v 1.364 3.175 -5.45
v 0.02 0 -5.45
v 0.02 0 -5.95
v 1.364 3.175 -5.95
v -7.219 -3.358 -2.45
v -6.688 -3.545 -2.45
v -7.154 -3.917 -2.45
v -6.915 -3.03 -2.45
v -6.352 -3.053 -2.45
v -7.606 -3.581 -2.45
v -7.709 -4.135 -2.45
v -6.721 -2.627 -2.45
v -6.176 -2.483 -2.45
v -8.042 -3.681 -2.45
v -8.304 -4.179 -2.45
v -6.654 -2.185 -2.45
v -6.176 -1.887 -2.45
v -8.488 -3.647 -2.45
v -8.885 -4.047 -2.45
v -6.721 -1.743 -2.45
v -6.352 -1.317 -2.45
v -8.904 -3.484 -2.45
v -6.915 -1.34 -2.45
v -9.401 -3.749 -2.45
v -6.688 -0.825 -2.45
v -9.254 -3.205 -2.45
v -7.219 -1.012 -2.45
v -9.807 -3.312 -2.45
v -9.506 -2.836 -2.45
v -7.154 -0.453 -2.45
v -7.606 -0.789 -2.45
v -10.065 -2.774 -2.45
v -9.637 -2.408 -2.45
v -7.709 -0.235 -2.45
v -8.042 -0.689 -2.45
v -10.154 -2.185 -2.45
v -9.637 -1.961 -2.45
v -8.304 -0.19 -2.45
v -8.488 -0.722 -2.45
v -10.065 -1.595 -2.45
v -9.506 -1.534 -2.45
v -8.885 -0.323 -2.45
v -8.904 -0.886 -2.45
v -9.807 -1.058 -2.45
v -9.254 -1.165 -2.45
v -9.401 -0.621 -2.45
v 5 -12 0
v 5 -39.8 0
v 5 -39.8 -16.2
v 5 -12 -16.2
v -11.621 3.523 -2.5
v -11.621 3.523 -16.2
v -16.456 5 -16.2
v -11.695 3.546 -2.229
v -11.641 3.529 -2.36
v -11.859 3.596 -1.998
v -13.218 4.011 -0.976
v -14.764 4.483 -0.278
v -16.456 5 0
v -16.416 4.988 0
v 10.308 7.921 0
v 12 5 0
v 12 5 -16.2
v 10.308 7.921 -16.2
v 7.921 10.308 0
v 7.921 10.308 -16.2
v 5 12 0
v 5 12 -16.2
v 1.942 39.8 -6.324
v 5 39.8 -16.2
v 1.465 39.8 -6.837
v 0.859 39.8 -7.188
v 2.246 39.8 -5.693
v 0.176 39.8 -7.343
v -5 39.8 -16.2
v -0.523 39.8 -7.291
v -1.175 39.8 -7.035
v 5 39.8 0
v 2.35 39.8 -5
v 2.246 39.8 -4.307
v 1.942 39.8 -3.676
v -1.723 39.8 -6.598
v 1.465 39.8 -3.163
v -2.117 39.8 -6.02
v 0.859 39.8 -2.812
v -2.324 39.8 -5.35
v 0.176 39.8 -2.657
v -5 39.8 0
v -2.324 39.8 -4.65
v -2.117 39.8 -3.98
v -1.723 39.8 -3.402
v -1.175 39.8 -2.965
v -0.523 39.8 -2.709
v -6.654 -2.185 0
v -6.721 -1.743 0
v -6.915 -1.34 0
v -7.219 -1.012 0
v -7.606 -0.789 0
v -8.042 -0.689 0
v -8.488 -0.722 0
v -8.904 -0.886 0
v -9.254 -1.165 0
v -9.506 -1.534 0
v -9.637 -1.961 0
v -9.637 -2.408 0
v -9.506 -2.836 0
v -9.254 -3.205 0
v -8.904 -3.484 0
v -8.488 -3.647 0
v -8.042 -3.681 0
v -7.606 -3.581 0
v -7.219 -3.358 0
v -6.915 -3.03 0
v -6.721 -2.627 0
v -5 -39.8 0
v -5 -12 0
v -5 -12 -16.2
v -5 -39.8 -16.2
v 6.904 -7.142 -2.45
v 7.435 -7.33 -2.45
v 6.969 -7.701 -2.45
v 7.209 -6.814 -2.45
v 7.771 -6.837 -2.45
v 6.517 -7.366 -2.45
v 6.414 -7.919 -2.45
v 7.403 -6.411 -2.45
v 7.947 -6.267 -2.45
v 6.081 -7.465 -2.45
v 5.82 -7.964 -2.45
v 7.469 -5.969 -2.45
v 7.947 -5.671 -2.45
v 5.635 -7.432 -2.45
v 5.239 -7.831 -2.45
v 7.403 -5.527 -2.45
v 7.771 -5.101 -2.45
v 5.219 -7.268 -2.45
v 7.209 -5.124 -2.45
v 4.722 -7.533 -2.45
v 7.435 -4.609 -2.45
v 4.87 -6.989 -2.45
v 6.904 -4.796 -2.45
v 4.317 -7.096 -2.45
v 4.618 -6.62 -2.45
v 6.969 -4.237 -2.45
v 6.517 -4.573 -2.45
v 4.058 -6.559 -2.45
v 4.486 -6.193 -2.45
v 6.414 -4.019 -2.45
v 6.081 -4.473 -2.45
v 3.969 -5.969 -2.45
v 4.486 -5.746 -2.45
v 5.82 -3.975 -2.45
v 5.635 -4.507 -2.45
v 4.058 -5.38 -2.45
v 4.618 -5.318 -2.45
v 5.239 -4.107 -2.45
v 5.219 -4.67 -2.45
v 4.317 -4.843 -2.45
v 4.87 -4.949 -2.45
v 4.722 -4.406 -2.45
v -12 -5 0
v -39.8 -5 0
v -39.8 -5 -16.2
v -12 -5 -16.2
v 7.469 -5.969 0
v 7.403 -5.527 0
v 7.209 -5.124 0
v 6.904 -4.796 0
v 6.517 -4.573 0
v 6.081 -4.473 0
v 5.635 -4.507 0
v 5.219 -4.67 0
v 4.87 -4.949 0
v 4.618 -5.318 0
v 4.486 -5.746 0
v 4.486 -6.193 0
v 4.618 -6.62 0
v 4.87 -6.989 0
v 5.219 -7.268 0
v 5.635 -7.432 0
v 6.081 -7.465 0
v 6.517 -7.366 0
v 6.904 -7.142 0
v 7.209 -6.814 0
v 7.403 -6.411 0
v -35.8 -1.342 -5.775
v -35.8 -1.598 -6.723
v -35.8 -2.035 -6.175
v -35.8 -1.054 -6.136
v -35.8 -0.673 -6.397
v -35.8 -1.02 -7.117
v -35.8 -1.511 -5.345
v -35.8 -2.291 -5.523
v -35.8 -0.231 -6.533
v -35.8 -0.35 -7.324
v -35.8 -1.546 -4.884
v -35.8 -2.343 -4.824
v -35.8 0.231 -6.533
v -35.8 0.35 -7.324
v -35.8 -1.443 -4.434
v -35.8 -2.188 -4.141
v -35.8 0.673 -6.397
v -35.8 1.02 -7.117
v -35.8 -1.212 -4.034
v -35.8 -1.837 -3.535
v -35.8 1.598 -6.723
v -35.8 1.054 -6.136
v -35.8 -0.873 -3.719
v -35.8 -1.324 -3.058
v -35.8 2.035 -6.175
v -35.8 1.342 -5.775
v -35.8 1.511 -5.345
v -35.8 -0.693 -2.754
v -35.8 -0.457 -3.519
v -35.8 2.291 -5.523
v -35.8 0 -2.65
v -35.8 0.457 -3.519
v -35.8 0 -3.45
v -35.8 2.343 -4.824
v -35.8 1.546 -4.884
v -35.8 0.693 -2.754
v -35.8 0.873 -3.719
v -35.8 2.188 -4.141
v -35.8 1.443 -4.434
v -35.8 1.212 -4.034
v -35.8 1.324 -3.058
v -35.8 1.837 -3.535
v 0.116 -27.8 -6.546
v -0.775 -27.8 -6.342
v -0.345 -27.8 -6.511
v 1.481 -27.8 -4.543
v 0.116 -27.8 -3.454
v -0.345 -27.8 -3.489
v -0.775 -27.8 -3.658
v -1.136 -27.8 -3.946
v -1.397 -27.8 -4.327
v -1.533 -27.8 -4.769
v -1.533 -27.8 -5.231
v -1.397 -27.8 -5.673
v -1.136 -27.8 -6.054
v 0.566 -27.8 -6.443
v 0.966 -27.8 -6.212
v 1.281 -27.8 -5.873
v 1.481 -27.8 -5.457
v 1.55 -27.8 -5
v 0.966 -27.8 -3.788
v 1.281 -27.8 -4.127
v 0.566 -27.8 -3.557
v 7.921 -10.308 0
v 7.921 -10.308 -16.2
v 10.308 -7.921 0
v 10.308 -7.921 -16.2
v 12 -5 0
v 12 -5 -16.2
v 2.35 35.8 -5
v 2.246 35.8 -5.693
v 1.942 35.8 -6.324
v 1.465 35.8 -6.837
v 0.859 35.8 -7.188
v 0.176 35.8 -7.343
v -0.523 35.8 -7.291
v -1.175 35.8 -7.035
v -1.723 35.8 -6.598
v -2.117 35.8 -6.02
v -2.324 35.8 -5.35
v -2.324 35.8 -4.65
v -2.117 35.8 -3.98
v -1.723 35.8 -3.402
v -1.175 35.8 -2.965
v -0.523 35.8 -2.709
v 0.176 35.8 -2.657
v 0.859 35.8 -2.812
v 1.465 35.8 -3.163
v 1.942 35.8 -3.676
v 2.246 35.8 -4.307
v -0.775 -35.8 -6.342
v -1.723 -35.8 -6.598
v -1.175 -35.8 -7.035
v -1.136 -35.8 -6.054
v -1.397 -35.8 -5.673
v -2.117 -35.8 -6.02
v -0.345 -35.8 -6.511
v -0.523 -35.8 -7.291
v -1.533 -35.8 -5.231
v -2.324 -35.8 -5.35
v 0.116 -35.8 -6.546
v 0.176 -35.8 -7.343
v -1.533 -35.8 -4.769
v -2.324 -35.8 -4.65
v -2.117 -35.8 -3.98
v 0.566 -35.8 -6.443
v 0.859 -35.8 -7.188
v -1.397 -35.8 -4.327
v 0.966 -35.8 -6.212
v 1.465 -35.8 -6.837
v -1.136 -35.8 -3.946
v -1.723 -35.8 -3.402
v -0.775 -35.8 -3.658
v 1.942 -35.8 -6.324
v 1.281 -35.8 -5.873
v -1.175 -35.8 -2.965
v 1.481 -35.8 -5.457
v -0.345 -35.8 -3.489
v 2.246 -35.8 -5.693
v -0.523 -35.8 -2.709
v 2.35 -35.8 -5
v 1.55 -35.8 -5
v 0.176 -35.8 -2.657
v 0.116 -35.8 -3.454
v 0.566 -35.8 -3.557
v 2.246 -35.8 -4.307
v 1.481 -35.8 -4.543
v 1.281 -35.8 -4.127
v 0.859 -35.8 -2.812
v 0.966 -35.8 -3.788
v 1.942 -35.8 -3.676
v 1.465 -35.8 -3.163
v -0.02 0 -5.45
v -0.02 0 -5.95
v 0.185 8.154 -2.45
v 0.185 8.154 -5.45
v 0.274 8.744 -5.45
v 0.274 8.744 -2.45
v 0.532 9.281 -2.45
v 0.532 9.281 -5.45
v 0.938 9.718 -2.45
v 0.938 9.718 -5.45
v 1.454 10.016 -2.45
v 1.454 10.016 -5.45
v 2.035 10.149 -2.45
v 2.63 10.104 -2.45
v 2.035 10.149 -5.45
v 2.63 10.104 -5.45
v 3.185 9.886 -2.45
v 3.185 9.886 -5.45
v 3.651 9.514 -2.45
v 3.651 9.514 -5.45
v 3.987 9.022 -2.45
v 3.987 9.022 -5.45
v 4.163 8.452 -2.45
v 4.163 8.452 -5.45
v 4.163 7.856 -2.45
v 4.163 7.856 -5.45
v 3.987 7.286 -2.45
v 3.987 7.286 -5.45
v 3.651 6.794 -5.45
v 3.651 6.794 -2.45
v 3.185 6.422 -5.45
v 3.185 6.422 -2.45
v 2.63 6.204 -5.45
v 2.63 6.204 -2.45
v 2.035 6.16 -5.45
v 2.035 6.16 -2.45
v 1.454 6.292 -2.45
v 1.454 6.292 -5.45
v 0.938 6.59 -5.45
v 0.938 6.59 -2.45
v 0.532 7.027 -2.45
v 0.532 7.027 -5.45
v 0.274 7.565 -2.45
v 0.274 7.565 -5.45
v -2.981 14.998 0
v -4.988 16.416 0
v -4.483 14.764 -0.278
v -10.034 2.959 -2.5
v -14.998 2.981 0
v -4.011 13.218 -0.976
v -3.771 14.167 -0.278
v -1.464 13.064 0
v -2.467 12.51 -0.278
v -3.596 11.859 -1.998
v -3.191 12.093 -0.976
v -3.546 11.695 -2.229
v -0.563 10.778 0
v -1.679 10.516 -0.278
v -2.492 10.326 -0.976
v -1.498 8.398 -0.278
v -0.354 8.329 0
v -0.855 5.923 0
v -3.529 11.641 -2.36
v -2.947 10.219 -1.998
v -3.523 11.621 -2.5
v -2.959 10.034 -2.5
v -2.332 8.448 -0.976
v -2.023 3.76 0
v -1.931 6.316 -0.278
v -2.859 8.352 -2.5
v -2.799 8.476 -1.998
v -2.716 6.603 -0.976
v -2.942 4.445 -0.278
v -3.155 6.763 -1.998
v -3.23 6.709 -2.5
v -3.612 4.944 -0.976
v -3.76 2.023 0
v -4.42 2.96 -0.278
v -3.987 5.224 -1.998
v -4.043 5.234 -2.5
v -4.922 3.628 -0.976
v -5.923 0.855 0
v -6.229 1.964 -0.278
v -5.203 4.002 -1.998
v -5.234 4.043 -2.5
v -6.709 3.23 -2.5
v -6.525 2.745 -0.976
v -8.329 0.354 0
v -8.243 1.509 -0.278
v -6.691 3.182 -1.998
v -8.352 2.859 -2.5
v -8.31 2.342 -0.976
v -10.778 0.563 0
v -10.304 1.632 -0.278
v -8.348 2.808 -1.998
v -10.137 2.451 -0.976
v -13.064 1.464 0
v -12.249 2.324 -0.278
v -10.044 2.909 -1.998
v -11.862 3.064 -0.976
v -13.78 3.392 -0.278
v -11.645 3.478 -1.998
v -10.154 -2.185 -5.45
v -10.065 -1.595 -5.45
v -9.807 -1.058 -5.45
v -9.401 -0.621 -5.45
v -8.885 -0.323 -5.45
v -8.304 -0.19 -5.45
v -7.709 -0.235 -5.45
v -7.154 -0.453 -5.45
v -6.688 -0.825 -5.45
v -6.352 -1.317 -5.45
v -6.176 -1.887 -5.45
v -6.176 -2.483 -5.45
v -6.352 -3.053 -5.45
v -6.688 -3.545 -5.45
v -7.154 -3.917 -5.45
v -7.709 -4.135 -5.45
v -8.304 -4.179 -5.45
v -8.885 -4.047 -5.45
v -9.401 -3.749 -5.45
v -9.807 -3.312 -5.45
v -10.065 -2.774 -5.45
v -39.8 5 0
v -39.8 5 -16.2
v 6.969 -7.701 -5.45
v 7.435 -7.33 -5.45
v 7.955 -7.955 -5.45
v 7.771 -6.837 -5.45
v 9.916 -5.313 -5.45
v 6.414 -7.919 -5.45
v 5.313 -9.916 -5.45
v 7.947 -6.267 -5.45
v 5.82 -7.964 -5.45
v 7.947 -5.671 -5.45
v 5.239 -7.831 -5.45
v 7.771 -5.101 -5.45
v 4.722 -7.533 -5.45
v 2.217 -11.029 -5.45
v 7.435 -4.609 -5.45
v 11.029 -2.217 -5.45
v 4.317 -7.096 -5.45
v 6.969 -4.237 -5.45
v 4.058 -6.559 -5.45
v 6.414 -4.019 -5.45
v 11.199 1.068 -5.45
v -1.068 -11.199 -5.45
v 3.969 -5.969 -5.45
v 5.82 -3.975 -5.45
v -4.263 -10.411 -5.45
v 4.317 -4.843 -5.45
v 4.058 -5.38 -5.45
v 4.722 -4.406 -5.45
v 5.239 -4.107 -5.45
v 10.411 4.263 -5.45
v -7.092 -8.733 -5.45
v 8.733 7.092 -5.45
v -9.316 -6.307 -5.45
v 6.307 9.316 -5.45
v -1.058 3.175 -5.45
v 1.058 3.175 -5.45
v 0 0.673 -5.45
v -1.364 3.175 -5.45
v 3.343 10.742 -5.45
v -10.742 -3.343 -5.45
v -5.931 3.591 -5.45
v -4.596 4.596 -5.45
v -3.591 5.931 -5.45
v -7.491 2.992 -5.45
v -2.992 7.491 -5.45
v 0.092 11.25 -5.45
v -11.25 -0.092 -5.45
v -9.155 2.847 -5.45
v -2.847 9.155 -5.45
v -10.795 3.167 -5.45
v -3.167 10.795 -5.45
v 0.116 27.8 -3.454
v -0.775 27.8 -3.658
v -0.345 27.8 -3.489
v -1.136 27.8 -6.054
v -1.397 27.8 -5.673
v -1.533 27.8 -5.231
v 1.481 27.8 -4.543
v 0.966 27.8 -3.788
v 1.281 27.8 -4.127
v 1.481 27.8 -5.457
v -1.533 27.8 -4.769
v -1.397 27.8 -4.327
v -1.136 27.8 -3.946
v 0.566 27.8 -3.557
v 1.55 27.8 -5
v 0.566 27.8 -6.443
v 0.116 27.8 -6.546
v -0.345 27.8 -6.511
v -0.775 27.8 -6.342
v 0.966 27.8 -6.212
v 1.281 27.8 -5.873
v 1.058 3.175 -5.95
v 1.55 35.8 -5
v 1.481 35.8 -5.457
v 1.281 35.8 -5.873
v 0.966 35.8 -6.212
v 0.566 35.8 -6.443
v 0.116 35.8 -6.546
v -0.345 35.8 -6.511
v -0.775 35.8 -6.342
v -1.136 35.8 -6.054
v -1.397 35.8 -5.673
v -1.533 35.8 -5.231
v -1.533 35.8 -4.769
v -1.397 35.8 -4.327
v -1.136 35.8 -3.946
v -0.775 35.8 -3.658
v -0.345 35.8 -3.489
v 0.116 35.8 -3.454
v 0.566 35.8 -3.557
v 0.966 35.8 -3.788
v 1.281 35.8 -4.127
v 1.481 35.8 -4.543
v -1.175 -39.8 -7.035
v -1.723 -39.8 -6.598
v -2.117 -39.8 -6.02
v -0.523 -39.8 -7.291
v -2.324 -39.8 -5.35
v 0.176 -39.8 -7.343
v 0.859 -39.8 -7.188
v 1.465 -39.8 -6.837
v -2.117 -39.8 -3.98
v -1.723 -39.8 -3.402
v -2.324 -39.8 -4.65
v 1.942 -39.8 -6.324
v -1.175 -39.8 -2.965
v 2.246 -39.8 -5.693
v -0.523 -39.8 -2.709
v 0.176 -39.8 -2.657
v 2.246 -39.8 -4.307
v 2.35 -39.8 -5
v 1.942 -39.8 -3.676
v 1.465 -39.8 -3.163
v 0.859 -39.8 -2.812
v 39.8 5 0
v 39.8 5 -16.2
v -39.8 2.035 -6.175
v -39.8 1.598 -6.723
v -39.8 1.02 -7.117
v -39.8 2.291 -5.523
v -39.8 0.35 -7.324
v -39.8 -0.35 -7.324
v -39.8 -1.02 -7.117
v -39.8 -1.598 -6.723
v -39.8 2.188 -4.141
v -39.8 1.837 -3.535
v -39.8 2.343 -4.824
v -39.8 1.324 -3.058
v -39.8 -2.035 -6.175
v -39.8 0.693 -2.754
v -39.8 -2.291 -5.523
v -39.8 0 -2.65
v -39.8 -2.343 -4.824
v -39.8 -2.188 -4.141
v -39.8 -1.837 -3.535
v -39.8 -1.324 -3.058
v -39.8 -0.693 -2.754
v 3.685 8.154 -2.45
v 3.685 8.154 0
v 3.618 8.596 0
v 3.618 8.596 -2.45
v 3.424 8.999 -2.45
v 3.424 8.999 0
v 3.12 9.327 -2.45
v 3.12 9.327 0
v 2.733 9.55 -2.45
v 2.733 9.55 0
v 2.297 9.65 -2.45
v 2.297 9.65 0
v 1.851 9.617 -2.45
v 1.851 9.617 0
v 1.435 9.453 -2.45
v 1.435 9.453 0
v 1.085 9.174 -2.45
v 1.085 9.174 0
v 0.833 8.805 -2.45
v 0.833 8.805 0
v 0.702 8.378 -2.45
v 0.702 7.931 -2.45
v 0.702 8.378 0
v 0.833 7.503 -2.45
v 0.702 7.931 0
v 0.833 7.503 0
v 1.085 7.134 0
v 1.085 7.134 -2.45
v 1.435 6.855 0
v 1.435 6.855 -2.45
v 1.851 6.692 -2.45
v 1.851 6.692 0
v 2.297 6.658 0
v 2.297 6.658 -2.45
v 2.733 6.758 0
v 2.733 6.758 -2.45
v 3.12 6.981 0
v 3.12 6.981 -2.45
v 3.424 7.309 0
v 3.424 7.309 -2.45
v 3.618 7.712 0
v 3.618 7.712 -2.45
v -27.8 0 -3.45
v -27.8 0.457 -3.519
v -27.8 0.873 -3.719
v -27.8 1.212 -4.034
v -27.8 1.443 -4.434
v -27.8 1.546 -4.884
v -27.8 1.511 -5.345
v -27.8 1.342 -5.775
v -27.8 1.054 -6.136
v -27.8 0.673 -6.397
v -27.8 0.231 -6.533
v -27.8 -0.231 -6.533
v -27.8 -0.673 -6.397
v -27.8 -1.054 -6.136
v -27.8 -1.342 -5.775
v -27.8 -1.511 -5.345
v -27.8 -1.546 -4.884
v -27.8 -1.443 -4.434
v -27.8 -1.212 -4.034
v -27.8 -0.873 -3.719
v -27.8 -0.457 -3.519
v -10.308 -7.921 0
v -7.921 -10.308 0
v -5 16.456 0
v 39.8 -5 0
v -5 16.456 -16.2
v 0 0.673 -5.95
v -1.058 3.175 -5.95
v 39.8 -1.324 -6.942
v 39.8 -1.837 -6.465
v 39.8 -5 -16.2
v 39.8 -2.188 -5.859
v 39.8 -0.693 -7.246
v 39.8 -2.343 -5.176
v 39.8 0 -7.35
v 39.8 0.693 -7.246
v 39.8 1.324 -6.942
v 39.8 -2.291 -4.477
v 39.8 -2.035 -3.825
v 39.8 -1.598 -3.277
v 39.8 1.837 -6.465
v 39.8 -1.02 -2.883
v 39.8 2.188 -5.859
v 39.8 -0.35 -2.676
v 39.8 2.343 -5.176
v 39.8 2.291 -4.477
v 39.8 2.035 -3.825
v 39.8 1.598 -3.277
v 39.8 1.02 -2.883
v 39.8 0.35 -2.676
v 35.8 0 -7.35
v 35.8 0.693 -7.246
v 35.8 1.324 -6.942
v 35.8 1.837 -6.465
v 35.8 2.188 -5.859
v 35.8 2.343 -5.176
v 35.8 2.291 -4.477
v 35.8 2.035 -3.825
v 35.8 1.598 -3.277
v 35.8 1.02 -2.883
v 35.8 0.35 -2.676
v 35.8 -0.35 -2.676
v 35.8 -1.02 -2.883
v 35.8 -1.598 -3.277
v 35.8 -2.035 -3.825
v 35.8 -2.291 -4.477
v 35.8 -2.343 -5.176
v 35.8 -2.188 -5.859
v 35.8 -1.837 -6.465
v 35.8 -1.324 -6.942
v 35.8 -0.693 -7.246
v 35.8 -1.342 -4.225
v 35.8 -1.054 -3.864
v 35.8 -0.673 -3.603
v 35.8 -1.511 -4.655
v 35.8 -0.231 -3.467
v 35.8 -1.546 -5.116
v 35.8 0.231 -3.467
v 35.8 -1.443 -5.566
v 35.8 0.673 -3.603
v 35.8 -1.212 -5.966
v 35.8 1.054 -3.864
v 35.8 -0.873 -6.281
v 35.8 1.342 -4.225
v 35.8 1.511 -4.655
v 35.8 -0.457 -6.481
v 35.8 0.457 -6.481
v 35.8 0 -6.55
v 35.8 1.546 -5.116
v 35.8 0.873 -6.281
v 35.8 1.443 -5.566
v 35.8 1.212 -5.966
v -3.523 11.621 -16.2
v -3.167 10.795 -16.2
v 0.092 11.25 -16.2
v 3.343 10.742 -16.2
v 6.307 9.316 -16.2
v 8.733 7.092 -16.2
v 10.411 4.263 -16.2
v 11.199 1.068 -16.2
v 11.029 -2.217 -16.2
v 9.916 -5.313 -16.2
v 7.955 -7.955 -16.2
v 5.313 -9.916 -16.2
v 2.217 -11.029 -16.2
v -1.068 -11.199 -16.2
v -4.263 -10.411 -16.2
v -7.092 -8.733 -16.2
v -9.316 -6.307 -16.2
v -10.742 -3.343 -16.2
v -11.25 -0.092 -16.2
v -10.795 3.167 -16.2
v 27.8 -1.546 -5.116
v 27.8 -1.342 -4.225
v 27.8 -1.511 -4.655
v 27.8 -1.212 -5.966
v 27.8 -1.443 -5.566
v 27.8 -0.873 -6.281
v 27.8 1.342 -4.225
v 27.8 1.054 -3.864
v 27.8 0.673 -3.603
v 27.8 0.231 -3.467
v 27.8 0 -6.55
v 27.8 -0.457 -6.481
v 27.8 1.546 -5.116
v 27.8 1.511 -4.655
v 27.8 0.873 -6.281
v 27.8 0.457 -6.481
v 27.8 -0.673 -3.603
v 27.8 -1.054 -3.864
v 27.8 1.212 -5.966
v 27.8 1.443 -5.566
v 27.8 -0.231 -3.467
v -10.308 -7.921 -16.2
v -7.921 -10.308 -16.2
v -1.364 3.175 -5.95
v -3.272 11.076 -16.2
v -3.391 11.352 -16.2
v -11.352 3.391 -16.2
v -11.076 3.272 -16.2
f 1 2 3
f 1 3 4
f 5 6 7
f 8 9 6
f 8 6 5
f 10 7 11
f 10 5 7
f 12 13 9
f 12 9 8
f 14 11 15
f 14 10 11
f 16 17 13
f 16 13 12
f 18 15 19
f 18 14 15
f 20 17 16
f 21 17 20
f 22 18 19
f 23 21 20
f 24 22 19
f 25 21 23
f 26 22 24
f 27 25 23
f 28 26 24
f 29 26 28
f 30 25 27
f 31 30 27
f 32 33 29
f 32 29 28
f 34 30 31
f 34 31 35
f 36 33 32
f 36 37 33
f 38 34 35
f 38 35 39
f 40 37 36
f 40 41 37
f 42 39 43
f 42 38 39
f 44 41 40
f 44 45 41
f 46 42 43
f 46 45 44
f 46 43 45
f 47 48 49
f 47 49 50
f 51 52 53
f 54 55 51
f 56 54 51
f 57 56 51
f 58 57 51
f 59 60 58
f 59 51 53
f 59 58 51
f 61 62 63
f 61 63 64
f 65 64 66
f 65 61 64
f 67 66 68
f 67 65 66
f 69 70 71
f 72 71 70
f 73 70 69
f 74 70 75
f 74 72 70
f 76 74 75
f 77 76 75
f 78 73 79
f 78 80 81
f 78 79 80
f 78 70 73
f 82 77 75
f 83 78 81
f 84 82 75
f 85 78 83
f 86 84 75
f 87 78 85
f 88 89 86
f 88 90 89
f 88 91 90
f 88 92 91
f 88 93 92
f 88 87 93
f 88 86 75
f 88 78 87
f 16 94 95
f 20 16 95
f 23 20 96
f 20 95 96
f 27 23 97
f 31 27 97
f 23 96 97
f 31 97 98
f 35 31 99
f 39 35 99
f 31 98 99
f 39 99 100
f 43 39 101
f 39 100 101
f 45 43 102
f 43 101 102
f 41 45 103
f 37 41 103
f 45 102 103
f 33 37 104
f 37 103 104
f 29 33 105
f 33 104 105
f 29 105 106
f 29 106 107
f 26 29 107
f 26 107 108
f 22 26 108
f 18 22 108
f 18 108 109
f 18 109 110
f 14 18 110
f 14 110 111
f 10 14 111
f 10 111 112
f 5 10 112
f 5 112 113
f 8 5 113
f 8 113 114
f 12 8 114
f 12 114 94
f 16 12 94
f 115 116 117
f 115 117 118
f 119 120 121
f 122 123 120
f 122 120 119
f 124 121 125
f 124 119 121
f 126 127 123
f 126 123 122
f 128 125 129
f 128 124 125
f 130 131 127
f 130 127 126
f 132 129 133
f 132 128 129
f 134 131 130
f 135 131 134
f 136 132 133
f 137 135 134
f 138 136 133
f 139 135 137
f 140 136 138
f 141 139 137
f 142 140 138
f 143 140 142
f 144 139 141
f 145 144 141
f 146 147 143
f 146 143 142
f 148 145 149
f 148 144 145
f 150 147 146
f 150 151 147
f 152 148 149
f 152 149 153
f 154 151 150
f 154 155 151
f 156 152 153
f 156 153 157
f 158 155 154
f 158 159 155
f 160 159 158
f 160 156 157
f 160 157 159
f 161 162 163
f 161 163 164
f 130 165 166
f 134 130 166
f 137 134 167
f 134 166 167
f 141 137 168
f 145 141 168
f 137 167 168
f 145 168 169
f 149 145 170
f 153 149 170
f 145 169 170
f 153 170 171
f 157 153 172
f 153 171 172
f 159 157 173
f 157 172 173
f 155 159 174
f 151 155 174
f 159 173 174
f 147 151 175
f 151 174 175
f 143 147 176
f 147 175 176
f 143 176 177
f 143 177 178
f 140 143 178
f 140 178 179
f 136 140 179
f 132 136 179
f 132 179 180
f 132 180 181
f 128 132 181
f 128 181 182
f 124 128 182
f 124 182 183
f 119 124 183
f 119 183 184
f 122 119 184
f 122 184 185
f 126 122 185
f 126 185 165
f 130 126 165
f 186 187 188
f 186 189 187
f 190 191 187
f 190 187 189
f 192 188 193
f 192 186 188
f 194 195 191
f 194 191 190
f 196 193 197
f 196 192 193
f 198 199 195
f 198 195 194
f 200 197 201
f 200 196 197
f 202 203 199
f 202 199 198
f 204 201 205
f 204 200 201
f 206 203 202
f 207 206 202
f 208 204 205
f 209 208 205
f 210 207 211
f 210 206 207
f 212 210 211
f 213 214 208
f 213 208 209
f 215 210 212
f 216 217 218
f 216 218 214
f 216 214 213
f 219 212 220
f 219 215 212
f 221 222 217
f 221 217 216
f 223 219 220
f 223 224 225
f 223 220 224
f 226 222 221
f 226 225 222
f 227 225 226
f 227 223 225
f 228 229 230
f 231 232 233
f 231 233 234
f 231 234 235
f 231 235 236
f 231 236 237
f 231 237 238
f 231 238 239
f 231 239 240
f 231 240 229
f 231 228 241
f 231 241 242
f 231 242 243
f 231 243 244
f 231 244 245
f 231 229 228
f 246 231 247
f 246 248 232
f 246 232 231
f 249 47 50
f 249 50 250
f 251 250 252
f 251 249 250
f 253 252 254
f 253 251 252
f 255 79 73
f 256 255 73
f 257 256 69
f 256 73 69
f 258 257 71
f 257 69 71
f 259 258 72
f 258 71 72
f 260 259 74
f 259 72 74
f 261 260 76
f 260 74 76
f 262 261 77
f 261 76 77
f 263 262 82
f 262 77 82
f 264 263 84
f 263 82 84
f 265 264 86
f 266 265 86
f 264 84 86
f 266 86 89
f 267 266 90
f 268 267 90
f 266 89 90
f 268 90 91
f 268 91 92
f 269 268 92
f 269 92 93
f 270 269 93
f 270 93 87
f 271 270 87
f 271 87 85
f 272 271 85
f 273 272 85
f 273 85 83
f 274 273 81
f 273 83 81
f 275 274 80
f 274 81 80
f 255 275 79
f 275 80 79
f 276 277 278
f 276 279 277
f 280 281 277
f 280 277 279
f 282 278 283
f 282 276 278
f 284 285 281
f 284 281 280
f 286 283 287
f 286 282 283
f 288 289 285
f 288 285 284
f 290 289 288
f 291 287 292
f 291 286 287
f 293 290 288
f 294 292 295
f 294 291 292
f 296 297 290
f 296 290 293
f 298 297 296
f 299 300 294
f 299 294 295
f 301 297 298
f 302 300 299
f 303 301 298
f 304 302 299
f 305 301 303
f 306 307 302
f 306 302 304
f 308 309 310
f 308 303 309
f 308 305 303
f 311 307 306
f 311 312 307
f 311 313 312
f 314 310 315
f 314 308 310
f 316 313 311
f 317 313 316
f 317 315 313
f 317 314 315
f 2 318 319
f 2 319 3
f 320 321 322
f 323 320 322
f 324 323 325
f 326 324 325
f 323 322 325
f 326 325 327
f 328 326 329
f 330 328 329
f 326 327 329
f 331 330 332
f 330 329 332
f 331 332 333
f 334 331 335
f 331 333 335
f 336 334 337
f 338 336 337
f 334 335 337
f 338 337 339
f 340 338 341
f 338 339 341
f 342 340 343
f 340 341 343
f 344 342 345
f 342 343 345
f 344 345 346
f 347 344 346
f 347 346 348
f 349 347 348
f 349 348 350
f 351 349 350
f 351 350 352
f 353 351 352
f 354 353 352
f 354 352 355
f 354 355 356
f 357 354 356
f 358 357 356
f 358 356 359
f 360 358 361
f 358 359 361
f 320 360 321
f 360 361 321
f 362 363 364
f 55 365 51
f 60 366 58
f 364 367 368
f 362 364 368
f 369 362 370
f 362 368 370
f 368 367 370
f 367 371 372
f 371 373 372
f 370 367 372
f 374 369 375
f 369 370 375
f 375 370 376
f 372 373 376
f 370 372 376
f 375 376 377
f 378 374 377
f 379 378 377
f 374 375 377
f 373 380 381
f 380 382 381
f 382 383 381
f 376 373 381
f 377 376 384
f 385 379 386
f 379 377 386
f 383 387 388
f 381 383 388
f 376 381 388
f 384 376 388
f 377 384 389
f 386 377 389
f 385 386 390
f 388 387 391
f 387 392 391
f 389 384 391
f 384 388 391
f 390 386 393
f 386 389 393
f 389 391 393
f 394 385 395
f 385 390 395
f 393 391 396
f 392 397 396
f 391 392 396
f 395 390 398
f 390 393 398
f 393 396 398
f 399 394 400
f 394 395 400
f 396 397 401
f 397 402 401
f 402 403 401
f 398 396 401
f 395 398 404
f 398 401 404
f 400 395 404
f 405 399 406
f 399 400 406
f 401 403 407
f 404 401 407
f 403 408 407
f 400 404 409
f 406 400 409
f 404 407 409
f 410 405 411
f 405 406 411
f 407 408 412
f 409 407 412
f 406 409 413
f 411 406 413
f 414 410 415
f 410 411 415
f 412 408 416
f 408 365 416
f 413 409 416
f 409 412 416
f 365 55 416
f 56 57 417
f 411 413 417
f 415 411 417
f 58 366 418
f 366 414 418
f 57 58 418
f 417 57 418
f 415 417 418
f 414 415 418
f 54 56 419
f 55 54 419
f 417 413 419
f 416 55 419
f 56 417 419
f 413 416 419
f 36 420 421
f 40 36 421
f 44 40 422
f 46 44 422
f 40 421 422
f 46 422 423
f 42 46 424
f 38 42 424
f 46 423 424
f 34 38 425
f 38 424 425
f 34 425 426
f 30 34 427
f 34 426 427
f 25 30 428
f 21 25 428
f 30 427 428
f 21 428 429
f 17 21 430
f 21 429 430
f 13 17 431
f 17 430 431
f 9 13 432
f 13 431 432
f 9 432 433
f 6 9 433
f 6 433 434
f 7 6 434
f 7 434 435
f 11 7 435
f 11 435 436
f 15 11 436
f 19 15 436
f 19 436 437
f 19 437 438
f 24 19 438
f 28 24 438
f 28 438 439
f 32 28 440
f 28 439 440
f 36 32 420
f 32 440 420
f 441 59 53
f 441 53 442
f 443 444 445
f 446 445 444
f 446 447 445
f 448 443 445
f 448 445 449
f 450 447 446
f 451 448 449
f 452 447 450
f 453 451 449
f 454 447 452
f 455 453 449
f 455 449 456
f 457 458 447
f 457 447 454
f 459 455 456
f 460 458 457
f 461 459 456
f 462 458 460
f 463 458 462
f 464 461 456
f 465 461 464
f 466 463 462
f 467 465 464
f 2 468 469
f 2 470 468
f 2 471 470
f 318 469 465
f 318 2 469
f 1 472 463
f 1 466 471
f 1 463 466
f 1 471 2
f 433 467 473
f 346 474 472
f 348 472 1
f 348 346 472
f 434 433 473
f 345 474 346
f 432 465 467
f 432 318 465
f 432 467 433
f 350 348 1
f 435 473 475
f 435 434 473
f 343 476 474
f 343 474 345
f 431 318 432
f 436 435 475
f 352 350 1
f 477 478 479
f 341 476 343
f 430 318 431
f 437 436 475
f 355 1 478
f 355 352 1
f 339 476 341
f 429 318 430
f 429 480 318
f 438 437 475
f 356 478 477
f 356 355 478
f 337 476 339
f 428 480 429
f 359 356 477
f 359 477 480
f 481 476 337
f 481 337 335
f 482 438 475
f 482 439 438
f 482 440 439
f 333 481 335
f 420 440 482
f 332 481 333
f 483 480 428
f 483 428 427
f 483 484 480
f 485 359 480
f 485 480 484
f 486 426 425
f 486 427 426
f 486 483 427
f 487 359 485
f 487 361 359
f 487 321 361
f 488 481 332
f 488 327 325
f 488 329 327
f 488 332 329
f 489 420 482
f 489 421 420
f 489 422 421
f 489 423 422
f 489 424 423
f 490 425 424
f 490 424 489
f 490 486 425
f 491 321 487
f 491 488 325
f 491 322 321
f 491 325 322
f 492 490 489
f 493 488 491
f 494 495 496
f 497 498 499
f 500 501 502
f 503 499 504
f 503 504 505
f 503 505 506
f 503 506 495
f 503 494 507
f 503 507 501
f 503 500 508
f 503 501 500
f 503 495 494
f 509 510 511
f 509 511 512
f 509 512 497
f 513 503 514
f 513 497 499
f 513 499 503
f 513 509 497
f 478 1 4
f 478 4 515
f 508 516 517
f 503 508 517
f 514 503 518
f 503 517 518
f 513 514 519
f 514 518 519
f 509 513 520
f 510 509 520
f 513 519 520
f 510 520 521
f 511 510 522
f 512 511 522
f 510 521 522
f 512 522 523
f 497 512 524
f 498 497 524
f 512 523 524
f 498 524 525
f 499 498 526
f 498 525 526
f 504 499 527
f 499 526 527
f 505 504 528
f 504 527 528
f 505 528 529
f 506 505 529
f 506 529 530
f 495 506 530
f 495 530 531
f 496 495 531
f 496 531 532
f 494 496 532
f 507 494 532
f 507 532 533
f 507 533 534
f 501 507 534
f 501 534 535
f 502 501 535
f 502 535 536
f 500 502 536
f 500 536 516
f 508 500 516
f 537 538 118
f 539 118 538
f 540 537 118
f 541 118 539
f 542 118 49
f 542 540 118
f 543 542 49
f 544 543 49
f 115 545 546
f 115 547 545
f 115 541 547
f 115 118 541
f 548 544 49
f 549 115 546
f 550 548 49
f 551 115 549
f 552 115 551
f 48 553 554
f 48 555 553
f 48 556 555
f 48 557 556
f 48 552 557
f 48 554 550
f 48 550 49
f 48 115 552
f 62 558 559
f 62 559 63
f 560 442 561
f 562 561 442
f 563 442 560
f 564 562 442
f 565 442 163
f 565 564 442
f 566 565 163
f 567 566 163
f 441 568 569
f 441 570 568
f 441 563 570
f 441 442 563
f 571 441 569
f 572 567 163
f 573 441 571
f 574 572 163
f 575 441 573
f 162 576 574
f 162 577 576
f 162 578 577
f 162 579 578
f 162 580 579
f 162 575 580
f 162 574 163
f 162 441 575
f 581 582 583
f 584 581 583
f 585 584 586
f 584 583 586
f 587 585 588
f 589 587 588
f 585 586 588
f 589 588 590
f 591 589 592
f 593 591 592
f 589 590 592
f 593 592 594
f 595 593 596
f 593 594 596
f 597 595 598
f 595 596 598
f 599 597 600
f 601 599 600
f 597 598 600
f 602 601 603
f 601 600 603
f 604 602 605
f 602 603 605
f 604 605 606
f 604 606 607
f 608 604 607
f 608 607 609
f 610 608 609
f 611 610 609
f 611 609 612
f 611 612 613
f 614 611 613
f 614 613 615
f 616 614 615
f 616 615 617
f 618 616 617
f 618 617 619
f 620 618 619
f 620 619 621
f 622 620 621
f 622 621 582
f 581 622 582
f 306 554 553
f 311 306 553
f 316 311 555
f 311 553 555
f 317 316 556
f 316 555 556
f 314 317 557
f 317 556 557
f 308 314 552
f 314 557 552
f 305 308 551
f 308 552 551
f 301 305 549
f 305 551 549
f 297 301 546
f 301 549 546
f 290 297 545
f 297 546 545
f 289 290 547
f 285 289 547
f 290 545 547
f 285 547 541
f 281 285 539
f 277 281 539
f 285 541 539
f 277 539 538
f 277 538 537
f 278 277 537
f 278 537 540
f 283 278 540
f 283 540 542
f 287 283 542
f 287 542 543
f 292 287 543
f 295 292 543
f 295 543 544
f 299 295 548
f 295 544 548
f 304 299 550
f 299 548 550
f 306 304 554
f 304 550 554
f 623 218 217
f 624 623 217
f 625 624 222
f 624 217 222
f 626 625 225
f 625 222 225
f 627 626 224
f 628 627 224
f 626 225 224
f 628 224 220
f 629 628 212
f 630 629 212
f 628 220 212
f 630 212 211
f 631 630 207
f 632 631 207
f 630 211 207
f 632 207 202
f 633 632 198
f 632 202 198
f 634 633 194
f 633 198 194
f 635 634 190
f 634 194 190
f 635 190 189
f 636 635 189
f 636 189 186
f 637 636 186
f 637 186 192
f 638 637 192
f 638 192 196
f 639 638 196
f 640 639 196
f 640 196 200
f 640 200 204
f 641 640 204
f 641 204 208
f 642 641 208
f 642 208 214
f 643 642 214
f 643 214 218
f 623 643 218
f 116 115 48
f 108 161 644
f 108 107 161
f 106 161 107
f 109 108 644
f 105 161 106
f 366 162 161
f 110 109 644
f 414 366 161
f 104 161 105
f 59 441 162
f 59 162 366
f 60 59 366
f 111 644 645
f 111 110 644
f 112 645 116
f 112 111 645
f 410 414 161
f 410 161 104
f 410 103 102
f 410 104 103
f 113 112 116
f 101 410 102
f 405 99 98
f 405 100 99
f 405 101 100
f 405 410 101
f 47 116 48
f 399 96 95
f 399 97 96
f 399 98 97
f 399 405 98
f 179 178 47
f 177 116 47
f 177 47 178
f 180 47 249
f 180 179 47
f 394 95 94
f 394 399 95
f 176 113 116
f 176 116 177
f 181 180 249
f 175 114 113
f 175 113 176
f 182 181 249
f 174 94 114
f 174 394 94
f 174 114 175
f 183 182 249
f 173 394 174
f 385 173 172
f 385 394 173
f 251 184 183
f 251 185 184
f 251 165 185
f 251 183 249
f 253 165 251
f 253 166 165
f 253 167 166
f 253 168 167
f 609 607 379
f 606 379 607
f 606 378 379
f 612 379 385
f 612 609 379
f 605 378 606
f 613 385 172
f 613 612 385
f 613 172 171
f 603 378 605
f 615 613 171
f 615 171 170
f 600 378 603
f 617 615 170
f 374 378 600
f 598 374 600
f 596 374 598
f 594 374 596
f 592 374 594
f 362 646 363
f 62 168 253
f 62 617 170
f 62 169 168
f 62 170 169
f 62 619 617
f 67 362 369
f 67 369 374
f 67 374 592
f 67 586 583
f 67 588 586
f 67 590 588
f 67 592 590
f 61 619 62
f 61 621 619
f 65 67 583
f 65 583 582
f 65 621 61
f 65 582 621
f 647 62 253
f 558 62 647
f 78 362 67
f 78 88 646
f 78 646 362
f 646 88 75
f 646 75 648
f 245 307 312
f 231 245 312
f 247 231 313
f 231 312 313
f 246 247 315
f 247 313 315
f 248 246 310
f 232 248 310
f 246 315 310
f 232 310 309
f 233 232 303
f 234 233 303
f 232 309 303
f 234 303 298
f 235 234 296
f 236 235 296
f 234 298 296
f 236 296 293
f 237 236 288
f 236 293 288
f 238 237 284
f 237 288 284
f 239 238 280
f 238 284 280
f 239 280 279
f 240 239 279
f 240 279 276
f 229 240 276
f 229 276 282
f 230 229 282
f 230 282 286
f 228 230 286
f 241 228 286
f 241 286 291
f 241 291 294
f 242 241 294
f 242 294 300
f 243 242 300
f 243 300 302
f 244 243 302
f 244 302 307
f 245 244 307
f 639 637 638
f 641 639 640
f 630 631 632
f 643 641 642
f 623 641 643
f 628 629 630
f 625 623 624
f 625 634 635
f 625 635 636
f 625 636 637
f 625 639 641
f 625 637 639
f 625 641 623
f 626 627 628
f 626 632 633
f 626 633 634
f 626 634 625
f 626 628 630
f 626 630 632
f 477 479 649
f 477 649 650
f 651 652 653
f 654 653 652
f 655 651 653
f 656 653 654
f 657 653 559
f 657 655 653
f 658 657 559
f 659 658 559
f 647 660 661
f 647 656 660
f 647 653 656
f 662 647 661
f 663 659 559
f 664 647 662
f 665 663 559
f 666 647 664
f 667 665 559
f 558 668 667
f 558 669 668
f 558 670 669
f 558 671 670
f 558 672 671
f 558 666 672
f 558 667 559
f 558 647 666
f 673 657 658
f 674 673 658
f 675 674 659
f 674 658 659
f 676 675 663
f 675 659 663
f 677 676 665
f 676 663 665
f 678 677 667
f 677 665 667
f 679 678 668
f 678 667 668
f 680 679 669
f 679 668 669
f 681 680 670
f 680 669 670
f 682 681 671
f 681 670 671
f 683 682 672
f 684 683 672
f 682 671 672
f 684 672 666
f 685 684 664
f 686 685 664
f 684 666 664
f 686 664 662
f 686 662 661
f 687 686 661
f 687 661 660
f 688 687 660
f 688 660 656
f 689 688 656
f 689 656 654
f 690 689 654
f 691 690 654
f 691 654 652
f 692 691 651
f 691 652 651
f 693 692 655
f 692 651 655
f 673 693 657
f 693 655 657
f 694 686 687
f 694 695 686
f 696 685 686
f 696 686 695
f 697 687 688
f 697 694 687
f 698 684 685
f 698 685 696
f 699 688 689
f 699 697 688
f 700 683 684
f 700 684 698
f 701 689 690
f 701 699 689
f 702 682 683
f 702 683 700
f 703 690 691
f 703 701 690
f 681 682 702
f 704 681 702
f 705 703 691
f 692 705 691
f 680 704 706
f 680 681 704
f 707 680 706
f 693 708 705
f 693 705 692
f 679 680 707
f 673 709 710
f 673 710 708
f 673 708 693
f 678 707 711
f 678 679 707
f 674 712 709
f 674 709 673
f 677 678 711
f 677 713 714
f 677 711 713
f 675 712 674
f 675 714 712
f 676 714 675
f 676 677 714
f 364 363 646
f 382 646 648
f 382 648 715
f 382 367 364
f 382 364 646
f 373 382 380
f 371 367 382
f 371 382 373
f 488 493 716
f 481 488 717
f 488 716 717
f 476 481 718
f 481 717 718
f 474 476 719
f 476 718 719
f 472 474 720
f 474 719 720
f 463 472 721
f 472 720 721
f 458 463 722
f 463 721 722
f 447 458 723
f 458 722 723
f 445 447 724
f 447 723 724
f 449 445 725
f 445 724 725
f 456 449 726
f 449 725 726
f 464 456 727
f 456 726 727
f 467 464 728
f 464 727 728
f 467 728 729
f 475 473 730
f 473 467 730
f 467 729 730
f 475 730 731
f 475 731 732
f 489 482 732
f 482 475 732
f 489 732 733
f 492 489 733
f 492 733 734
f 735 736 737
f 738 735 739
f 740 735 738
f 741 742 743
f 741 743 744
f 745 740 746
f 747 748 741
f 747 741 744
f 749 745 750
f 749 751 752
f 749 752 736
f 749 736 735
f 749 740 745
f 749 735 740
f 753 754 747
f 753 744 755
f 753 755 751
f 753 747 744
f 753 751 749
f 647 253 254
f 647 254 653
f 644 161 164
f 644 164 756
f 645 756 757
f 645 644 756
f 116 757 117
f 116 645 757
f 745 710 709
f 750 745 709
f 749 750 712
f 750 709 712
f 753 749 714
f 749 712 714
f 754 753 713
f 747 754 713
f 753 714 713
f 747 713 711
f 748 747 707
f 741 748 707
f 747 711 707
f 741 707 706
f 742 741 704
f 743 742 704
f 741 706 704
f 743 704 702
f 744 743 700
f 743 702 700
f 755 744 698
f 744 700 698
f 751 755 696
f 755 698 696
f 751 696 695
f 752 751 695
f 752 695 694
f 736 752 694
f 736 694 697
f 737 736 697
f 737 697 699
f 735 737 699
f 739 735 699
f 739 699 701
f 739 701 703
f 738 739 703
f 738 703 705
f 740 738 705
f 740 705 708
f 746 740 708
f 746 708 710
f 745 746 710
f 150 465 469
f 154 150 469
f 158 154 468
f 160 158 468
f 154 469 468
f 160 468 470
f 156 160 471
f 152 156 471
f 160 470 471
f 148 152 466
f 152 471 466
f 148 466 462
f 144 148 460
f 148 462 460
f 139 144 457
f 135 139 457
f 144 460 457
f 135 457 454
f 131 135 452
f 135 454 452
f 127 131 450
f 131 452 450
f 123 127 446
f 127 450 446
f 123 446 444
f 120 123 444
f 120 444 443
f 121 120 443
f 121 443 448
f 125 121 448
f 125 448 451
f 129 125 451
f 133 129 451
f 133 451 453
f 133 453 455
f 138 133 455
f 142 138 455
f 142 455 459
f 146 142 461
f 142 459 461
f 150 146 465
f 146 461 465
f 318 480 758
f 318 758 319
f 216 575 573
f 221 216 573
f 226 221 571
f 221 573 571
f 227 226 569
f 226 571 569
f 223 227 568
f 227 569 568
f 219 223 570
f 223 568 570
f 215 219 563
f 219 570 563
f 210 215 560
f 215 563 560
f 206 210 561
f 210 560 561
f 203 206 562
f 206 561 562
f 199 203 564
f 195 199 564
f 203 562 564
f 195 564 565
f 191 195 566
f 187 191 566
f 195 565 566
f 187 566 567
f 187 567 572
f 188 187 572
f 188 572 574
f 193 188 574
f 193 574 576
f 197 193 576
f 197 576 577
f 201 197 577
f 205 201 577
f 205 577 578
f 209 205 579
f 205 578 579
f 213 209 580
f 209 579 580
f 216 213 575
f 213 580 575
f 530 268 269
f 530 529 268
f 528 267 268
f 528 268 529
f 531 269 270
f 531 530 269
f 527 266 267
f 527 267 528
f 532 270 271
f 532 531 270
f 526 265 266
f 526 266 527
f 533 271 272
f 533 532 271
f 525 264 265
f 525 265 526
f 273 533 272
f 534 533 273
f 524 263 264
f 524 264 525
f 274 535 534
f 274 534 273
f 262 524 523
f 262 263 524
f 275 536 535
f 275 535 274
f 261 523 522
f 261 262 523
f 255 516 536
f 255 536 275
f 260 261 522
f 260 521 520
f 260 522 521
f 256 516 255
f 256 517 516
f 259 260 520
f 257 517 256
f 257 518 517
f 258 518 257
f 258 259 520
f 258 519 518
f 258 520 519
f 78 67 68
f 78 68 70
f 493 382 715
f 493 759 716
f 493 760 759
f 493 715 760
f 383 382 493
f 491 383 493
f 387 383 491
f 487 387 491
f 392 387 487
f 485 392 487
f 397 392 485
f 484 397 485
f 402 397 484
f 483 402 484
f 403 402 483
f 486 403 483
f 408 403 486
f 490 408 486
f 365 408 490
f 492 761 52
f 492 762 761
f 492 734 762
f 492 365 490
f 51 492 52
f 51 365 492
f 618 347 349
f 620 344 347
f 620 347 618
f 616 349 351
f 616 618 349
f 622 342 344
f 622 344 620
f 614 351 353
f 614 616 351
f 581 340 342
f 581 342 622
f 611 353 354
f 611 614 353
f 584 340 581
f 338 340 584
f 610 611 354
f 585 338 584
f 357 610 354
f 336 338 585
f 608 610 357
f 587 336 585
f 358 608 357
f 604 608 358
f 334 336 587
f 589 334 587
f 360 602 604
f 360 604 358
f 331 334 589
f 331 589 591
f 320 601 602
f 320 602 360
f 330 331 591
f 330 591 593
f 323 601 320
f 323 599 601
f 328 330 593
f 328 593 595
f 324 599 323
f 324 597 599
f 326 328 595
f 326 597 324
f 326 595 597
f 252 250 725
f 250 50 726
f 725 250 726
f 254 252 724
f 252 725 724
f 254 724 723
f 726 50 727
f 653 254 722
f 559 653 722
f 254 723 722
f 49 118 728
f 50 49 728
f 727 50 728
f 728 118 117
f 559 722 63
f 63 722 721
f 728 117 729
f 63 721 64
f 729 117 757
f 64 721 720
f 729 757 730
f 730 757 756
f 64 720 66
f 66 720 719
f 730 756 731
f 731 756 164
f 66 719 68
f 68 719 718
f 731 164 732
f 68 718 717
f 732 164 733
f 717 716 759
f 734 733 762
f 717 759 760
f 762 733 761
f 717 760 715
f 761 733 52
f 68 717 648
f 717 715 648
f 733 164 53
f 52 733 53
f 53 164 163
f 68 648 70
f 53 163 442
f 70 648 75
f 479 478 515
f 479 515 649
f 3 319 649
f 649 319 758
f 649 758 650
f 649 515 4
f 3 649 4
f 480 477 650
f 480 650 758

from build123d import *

# Parameters (mm, degrees)
BOSS_EXTRUDE1_DEPTH     = 22.7
SKETCH5_R               = 1.5
CUT_EXTRUDE1_DEPTH      = 70
CUT_EXTRUDE3_DEPTH      = 17.25
CUT_EXTRUDE3_DEPTH_BACK = 17.25
SKETCH6_R               = 11.25
SKETCH7_R               = 2
CUT_EXTRUDE4_DEPTH      = 3
CUT_EXTRUDE5_DEPTH      = 58
CUT_EXTRUDE5_DEPTH_BACK = 66
SKETCH8_W               = 6.5
SKETCH8_H               = 79.6
SKETCH9_R               = 2.35
SKETCH9_R_2             = 1.55
CUT_EXTRUDE7_DEPTH      = 4
SKETCH9_3_R             = 1.55
CUT_EXTRUDE20_DEPTH     = 12
SKETCH21_R              = 2.35
SKETCH21_R_2            = 1.55
CUT_EXTRUDE22_DEPTH     = 4
SKETCH21_2_R            = 1.55
CUT_EXTRUDE23_DEPTH     = 12
CUT_EXTRUDE24_START     = -4
SKETCH19_R              = 2.35
SKETCH19_R_2            = 1.55
CUT_EXTRUDE24_DEPTH     = 4
CUT_EXTRUDE25_START     = -12
SKETCH19_2_R            = 1.55
CUT_EXTRUDE25_DEPTH     = 12
CUT_EXTRUDE26_START     = -4
SKETCH20_R              = 2.35
SKETCH20_R_2            = 1.55
CUT_EXTRUDE26_DEPTH     = 4
CUT_EXTRUDE27_START     = -12
SKETCH20_2_R            = 1.55
CUT_EXTRUDE27_DEPTH     = 12
FILLET2_R               = 2.5
BOSS_EXTRUDE2_DEPTH     = 0.5


with BuildPart() as part:
    # Sketch4 → Boss-Extrude1 (new body)
    with BuildSketch(Plane.XY):
        with BuildLine():
            Line((-5, 39.8), (-5, 12))
            ThreePointArc((-5, 12), (-9.192388155, 9.192388155), (-12, 5))
            Line((-12, 5), (-39.8, 5))
            Line((-39.8, 5), (-39.8, -5))
            Line((-39.8, -5), (-12, -5))
            ThreePointArc((-12, -5), (-9.192388155, -9.192388155), (-5, -12))
            Line((-5, -12), (-5, -39.8))
            Line((-5, -39.8), (5, -39.8))
            Line((5, -39.8), (5, -12))
            ThreePointArc((5, -12), (9.192388155, -9.192388155), (12, -5))
            Line((12, -5), (39.8, -5))
            Line((39.8, -5), (39.8, 5))
            Line((39.8, 5), (12, 5))
            ThreePointArc((12, 5), (9.192388155, 9.192388155), (5, 12))
            Line((5, 12), (5, 39.8))
            Line((5, 39.8), (-5, 39.8))
        make_face()
    extrude(amount=-BOSS_EXTRUDE1_DEPTH)

    # Sketch5 → Cut-Extrude1 (cut)
    with BuildSketch(Plane.XY):
        with Locations((2.184887392, 8.154110756)):
            Circle(SKETCH5_R)
        with Locations((-8.154110756, -2.184887392)):
            Circle(SKETCH5_R)
        with Locations((5.969223364, -5.969223364)):
            Circle(SKETCH5_R)
        with BuildLine():
            Line((-5, 16.456455054), (-3.523070126, 11.621395871))
            ThreePointArc((-3.523070126, 11.621395871), (-4.596194078, 4.596194078), (-11.621395871, 3.523070126))
            Line((-11.621395871, 3.523070126), (-16.456455054, 5))
            Line((-16.456455054, 5), (-14.526937175, 6.929517879))
            ThreePointArc((-14.526937175, 6.929517879), (-13.081475452, 13.081475452), (-6.929517879, 14.526937175))
            Line((-6.929517879, 14.526937175), (-5, 16.456455054))
        make_face()
    extrude(amount=-CUT_EXTRUDE1_DEPTH, mode=Mode.SUBTRACT)

    # Sketch6 → Cut-Extrude3 (cut, two sides: drawn at the far end of the back side and taken through both)
    with BuildSketch(Plane(origin=(0, 0, -22.7), x_dir=(-1, 0, 0), z_dir=(0, 0, -1)).offset(-CUT_EXTRUDE3_DEPTH_BACK)):
        Circle(SKETCH6_R)
    extrude(amount=CUT_EXTRUDE3_DEPTH + CUT_EXTRUDE3_DEPTH_BACK, mode=Mode.SUBTRACT)

    # Sketch7 → Cut-Extrude4 (cut)
    with BuildSketch(Plane(origin=(0, 0, -5.45), x_dir=(-1, 0, 0), z_dir=(0, 0, -1))):
        with Locations((-2.184887392, 8.154110756)):
            Circle(SKETCH7_R)
        with Locations((-5.969223364, -5.969223364)):
            Circle(SKETCH7_R)
        with Locations((8.154110756, -2.184887392)):
            Circle(SKETCH7_R)
    extrude(amount=-CUT_EXTRUDE4_DEPTH, mode=Mode.SUBTRACT)

    # Sketch8 → Cut-Extrude5 (cut, two sides: drawn at the far end of the back side and taken through both)
    with BuildSketch(Plane.ZY.offset(5).offset(-CUT_EXTRUDE5_DEPTH_BACK)):
        with Locations((-19.45, 0)):
            Rectangle(SKETCH8_W, SKETCH8_H)
    extrude(amount=CUT_EXTRUDE5_DEPTH + CUT_EXTRUDE5_DEPTH_BACK, mode=Mode.SUBTRACT)

    # Sketch9 → Cut-Extrude7 (cut)
    with BuildSketch(Plane(origin=(0, 39.8, 0), x_dir=(1, 0, 0), z_dir=(0, 1, 0))):
        with Locations((0, 5)):
            Circle(SKETCH9_R)
        with Locations((0, 5)):
            Circle(SKETCH9_R_2, mode=Mode.SUBTRACT)
    extrude(amount=-CUT_EXTRUDE7_DEPTH, mode=Mode.SUBTRACT)

    # Sketch9<3> → Cut-Extrude20 (cut)
    with BuildSketch(Plane(origin=(0, 39.8, 0), x_dir=(1, 0, 0), z_dir=(0, 1, 0))):
        with Locations((0, 5)):
            Circle(SKETCH9_3_R)
    extrude(amount=-CUT_EXTRUDE20_DEPTH, mode=Mode.SUBTRACT)

    # Sketch21 → Cut-Extrude22 (cut)
    with BuildSketch(Plane.ZY.offset(39.8)):
        with Locations((-5, 0)):
            Circle(SKETCH21_R)
        with Locations((-5, 0)):
            Circle(SKETCH21_R_2, mode=Mode.SUBTRACT)
    extrude(amount=-CUT_EXTRUDE22_DEPTH, mode=Mode.SUBTRACT)

    # Sketch21<2> → Cut-Extrude23 (cut)
    with BuildSketch(Plane.ZY.offset(39.8)):
        with Locations((-5, 0)):
            Circle(SKETCH21_2_R)
    extrude(amount=-CUT_EXTRUDE23_DEPTH, mode=Mode.SUBTRACT)

    # Sketch19 → Cut-Extrude24 (cut)
    with BuildSketch(Plane(origin=(39.8, 0, 0), x_dir=(0, 0, -1), z_dir=(1, 0, 0)).offset(CUT_EXTRUDE24_START)):
        with Locations((5, 0)):
            Circle(SKETCH19_R)
        with Locations((5, 0)):
            Circle(SKETCH19_R_2, mode=Mode.SUBTRACT)
    extrude(amount=CUT_EXTRUDE24_DEPTH, mode=Mode.SUBTRACT)

    # Sketch19<2> → Cut-Extrude25 (cut)
    with BuildSketch(Plane(origin=(39.8, 0, 0), x_dir=(0, 0, -1), z_dir=(1, 0, 0)).offset(CUT_EXTRUDE25_START)):
        with Locations((5, 0)):
            Circle(SKETCH19_2_R)
    extrude(amount=CUT_EXTRUDE25_DEPTH, mode=Mode.SUBTRACT)

    # Sketch20 → Cut-Extrude26 (cut)
    with BuildSketch(Plane.XZ.offset(39.8).offset(CUT_EXTRUDE26_START)):
        with Locations((0, -5)):
            Circle(SKETCH20_R)
        with Locations((0, -5)):
            Circle(SKETCH20_R_2, mode=Mode.SUBTRACT)
    extrude(amount=CUT_EXTRUDE26_DEPTH, mode=Mode.SUBTRACT)

    # Sketch20<2> → Cut-Extrude27 (cut)
    with BuildSketch(Plane.XZ.offset(39.8).offset(CUT_EXTRUDE27_START)):
        with Locations((0, -5)):
            Circle(SKETCH20_2_R)
    extrude(amount=CUT_EXTRUDE27_DEPTH, mode=Mode.SUBTRACT)

    # Fillet2
    fillet2_edges = [part.edges().sort_by_distance(p)[0] for p in [
        (-4.596194078, 4.596194078, 0),
    ]]
    fillet(fillet2_edges, radius=FILLET2_R)

    # Sketch22 → Boss-Extrude2 (add)
    with BuildSketch(Plane(origin=(0, 0, -5.45), x_dir=(-1, 0, 0), z_dir=(0, 0, -1))):
        Polygon((-1.363621795, 3.175), (-1.058333333, 3.175), (0, 0.672906651), (1.058333333, 3.175), (1.363621795, 3.175), (0.020352564, 0), (-0.020352564, 0), align=None)
    extrude(amount=BOSS_EXTRUDE2_DEPTH)


solid = part.part
